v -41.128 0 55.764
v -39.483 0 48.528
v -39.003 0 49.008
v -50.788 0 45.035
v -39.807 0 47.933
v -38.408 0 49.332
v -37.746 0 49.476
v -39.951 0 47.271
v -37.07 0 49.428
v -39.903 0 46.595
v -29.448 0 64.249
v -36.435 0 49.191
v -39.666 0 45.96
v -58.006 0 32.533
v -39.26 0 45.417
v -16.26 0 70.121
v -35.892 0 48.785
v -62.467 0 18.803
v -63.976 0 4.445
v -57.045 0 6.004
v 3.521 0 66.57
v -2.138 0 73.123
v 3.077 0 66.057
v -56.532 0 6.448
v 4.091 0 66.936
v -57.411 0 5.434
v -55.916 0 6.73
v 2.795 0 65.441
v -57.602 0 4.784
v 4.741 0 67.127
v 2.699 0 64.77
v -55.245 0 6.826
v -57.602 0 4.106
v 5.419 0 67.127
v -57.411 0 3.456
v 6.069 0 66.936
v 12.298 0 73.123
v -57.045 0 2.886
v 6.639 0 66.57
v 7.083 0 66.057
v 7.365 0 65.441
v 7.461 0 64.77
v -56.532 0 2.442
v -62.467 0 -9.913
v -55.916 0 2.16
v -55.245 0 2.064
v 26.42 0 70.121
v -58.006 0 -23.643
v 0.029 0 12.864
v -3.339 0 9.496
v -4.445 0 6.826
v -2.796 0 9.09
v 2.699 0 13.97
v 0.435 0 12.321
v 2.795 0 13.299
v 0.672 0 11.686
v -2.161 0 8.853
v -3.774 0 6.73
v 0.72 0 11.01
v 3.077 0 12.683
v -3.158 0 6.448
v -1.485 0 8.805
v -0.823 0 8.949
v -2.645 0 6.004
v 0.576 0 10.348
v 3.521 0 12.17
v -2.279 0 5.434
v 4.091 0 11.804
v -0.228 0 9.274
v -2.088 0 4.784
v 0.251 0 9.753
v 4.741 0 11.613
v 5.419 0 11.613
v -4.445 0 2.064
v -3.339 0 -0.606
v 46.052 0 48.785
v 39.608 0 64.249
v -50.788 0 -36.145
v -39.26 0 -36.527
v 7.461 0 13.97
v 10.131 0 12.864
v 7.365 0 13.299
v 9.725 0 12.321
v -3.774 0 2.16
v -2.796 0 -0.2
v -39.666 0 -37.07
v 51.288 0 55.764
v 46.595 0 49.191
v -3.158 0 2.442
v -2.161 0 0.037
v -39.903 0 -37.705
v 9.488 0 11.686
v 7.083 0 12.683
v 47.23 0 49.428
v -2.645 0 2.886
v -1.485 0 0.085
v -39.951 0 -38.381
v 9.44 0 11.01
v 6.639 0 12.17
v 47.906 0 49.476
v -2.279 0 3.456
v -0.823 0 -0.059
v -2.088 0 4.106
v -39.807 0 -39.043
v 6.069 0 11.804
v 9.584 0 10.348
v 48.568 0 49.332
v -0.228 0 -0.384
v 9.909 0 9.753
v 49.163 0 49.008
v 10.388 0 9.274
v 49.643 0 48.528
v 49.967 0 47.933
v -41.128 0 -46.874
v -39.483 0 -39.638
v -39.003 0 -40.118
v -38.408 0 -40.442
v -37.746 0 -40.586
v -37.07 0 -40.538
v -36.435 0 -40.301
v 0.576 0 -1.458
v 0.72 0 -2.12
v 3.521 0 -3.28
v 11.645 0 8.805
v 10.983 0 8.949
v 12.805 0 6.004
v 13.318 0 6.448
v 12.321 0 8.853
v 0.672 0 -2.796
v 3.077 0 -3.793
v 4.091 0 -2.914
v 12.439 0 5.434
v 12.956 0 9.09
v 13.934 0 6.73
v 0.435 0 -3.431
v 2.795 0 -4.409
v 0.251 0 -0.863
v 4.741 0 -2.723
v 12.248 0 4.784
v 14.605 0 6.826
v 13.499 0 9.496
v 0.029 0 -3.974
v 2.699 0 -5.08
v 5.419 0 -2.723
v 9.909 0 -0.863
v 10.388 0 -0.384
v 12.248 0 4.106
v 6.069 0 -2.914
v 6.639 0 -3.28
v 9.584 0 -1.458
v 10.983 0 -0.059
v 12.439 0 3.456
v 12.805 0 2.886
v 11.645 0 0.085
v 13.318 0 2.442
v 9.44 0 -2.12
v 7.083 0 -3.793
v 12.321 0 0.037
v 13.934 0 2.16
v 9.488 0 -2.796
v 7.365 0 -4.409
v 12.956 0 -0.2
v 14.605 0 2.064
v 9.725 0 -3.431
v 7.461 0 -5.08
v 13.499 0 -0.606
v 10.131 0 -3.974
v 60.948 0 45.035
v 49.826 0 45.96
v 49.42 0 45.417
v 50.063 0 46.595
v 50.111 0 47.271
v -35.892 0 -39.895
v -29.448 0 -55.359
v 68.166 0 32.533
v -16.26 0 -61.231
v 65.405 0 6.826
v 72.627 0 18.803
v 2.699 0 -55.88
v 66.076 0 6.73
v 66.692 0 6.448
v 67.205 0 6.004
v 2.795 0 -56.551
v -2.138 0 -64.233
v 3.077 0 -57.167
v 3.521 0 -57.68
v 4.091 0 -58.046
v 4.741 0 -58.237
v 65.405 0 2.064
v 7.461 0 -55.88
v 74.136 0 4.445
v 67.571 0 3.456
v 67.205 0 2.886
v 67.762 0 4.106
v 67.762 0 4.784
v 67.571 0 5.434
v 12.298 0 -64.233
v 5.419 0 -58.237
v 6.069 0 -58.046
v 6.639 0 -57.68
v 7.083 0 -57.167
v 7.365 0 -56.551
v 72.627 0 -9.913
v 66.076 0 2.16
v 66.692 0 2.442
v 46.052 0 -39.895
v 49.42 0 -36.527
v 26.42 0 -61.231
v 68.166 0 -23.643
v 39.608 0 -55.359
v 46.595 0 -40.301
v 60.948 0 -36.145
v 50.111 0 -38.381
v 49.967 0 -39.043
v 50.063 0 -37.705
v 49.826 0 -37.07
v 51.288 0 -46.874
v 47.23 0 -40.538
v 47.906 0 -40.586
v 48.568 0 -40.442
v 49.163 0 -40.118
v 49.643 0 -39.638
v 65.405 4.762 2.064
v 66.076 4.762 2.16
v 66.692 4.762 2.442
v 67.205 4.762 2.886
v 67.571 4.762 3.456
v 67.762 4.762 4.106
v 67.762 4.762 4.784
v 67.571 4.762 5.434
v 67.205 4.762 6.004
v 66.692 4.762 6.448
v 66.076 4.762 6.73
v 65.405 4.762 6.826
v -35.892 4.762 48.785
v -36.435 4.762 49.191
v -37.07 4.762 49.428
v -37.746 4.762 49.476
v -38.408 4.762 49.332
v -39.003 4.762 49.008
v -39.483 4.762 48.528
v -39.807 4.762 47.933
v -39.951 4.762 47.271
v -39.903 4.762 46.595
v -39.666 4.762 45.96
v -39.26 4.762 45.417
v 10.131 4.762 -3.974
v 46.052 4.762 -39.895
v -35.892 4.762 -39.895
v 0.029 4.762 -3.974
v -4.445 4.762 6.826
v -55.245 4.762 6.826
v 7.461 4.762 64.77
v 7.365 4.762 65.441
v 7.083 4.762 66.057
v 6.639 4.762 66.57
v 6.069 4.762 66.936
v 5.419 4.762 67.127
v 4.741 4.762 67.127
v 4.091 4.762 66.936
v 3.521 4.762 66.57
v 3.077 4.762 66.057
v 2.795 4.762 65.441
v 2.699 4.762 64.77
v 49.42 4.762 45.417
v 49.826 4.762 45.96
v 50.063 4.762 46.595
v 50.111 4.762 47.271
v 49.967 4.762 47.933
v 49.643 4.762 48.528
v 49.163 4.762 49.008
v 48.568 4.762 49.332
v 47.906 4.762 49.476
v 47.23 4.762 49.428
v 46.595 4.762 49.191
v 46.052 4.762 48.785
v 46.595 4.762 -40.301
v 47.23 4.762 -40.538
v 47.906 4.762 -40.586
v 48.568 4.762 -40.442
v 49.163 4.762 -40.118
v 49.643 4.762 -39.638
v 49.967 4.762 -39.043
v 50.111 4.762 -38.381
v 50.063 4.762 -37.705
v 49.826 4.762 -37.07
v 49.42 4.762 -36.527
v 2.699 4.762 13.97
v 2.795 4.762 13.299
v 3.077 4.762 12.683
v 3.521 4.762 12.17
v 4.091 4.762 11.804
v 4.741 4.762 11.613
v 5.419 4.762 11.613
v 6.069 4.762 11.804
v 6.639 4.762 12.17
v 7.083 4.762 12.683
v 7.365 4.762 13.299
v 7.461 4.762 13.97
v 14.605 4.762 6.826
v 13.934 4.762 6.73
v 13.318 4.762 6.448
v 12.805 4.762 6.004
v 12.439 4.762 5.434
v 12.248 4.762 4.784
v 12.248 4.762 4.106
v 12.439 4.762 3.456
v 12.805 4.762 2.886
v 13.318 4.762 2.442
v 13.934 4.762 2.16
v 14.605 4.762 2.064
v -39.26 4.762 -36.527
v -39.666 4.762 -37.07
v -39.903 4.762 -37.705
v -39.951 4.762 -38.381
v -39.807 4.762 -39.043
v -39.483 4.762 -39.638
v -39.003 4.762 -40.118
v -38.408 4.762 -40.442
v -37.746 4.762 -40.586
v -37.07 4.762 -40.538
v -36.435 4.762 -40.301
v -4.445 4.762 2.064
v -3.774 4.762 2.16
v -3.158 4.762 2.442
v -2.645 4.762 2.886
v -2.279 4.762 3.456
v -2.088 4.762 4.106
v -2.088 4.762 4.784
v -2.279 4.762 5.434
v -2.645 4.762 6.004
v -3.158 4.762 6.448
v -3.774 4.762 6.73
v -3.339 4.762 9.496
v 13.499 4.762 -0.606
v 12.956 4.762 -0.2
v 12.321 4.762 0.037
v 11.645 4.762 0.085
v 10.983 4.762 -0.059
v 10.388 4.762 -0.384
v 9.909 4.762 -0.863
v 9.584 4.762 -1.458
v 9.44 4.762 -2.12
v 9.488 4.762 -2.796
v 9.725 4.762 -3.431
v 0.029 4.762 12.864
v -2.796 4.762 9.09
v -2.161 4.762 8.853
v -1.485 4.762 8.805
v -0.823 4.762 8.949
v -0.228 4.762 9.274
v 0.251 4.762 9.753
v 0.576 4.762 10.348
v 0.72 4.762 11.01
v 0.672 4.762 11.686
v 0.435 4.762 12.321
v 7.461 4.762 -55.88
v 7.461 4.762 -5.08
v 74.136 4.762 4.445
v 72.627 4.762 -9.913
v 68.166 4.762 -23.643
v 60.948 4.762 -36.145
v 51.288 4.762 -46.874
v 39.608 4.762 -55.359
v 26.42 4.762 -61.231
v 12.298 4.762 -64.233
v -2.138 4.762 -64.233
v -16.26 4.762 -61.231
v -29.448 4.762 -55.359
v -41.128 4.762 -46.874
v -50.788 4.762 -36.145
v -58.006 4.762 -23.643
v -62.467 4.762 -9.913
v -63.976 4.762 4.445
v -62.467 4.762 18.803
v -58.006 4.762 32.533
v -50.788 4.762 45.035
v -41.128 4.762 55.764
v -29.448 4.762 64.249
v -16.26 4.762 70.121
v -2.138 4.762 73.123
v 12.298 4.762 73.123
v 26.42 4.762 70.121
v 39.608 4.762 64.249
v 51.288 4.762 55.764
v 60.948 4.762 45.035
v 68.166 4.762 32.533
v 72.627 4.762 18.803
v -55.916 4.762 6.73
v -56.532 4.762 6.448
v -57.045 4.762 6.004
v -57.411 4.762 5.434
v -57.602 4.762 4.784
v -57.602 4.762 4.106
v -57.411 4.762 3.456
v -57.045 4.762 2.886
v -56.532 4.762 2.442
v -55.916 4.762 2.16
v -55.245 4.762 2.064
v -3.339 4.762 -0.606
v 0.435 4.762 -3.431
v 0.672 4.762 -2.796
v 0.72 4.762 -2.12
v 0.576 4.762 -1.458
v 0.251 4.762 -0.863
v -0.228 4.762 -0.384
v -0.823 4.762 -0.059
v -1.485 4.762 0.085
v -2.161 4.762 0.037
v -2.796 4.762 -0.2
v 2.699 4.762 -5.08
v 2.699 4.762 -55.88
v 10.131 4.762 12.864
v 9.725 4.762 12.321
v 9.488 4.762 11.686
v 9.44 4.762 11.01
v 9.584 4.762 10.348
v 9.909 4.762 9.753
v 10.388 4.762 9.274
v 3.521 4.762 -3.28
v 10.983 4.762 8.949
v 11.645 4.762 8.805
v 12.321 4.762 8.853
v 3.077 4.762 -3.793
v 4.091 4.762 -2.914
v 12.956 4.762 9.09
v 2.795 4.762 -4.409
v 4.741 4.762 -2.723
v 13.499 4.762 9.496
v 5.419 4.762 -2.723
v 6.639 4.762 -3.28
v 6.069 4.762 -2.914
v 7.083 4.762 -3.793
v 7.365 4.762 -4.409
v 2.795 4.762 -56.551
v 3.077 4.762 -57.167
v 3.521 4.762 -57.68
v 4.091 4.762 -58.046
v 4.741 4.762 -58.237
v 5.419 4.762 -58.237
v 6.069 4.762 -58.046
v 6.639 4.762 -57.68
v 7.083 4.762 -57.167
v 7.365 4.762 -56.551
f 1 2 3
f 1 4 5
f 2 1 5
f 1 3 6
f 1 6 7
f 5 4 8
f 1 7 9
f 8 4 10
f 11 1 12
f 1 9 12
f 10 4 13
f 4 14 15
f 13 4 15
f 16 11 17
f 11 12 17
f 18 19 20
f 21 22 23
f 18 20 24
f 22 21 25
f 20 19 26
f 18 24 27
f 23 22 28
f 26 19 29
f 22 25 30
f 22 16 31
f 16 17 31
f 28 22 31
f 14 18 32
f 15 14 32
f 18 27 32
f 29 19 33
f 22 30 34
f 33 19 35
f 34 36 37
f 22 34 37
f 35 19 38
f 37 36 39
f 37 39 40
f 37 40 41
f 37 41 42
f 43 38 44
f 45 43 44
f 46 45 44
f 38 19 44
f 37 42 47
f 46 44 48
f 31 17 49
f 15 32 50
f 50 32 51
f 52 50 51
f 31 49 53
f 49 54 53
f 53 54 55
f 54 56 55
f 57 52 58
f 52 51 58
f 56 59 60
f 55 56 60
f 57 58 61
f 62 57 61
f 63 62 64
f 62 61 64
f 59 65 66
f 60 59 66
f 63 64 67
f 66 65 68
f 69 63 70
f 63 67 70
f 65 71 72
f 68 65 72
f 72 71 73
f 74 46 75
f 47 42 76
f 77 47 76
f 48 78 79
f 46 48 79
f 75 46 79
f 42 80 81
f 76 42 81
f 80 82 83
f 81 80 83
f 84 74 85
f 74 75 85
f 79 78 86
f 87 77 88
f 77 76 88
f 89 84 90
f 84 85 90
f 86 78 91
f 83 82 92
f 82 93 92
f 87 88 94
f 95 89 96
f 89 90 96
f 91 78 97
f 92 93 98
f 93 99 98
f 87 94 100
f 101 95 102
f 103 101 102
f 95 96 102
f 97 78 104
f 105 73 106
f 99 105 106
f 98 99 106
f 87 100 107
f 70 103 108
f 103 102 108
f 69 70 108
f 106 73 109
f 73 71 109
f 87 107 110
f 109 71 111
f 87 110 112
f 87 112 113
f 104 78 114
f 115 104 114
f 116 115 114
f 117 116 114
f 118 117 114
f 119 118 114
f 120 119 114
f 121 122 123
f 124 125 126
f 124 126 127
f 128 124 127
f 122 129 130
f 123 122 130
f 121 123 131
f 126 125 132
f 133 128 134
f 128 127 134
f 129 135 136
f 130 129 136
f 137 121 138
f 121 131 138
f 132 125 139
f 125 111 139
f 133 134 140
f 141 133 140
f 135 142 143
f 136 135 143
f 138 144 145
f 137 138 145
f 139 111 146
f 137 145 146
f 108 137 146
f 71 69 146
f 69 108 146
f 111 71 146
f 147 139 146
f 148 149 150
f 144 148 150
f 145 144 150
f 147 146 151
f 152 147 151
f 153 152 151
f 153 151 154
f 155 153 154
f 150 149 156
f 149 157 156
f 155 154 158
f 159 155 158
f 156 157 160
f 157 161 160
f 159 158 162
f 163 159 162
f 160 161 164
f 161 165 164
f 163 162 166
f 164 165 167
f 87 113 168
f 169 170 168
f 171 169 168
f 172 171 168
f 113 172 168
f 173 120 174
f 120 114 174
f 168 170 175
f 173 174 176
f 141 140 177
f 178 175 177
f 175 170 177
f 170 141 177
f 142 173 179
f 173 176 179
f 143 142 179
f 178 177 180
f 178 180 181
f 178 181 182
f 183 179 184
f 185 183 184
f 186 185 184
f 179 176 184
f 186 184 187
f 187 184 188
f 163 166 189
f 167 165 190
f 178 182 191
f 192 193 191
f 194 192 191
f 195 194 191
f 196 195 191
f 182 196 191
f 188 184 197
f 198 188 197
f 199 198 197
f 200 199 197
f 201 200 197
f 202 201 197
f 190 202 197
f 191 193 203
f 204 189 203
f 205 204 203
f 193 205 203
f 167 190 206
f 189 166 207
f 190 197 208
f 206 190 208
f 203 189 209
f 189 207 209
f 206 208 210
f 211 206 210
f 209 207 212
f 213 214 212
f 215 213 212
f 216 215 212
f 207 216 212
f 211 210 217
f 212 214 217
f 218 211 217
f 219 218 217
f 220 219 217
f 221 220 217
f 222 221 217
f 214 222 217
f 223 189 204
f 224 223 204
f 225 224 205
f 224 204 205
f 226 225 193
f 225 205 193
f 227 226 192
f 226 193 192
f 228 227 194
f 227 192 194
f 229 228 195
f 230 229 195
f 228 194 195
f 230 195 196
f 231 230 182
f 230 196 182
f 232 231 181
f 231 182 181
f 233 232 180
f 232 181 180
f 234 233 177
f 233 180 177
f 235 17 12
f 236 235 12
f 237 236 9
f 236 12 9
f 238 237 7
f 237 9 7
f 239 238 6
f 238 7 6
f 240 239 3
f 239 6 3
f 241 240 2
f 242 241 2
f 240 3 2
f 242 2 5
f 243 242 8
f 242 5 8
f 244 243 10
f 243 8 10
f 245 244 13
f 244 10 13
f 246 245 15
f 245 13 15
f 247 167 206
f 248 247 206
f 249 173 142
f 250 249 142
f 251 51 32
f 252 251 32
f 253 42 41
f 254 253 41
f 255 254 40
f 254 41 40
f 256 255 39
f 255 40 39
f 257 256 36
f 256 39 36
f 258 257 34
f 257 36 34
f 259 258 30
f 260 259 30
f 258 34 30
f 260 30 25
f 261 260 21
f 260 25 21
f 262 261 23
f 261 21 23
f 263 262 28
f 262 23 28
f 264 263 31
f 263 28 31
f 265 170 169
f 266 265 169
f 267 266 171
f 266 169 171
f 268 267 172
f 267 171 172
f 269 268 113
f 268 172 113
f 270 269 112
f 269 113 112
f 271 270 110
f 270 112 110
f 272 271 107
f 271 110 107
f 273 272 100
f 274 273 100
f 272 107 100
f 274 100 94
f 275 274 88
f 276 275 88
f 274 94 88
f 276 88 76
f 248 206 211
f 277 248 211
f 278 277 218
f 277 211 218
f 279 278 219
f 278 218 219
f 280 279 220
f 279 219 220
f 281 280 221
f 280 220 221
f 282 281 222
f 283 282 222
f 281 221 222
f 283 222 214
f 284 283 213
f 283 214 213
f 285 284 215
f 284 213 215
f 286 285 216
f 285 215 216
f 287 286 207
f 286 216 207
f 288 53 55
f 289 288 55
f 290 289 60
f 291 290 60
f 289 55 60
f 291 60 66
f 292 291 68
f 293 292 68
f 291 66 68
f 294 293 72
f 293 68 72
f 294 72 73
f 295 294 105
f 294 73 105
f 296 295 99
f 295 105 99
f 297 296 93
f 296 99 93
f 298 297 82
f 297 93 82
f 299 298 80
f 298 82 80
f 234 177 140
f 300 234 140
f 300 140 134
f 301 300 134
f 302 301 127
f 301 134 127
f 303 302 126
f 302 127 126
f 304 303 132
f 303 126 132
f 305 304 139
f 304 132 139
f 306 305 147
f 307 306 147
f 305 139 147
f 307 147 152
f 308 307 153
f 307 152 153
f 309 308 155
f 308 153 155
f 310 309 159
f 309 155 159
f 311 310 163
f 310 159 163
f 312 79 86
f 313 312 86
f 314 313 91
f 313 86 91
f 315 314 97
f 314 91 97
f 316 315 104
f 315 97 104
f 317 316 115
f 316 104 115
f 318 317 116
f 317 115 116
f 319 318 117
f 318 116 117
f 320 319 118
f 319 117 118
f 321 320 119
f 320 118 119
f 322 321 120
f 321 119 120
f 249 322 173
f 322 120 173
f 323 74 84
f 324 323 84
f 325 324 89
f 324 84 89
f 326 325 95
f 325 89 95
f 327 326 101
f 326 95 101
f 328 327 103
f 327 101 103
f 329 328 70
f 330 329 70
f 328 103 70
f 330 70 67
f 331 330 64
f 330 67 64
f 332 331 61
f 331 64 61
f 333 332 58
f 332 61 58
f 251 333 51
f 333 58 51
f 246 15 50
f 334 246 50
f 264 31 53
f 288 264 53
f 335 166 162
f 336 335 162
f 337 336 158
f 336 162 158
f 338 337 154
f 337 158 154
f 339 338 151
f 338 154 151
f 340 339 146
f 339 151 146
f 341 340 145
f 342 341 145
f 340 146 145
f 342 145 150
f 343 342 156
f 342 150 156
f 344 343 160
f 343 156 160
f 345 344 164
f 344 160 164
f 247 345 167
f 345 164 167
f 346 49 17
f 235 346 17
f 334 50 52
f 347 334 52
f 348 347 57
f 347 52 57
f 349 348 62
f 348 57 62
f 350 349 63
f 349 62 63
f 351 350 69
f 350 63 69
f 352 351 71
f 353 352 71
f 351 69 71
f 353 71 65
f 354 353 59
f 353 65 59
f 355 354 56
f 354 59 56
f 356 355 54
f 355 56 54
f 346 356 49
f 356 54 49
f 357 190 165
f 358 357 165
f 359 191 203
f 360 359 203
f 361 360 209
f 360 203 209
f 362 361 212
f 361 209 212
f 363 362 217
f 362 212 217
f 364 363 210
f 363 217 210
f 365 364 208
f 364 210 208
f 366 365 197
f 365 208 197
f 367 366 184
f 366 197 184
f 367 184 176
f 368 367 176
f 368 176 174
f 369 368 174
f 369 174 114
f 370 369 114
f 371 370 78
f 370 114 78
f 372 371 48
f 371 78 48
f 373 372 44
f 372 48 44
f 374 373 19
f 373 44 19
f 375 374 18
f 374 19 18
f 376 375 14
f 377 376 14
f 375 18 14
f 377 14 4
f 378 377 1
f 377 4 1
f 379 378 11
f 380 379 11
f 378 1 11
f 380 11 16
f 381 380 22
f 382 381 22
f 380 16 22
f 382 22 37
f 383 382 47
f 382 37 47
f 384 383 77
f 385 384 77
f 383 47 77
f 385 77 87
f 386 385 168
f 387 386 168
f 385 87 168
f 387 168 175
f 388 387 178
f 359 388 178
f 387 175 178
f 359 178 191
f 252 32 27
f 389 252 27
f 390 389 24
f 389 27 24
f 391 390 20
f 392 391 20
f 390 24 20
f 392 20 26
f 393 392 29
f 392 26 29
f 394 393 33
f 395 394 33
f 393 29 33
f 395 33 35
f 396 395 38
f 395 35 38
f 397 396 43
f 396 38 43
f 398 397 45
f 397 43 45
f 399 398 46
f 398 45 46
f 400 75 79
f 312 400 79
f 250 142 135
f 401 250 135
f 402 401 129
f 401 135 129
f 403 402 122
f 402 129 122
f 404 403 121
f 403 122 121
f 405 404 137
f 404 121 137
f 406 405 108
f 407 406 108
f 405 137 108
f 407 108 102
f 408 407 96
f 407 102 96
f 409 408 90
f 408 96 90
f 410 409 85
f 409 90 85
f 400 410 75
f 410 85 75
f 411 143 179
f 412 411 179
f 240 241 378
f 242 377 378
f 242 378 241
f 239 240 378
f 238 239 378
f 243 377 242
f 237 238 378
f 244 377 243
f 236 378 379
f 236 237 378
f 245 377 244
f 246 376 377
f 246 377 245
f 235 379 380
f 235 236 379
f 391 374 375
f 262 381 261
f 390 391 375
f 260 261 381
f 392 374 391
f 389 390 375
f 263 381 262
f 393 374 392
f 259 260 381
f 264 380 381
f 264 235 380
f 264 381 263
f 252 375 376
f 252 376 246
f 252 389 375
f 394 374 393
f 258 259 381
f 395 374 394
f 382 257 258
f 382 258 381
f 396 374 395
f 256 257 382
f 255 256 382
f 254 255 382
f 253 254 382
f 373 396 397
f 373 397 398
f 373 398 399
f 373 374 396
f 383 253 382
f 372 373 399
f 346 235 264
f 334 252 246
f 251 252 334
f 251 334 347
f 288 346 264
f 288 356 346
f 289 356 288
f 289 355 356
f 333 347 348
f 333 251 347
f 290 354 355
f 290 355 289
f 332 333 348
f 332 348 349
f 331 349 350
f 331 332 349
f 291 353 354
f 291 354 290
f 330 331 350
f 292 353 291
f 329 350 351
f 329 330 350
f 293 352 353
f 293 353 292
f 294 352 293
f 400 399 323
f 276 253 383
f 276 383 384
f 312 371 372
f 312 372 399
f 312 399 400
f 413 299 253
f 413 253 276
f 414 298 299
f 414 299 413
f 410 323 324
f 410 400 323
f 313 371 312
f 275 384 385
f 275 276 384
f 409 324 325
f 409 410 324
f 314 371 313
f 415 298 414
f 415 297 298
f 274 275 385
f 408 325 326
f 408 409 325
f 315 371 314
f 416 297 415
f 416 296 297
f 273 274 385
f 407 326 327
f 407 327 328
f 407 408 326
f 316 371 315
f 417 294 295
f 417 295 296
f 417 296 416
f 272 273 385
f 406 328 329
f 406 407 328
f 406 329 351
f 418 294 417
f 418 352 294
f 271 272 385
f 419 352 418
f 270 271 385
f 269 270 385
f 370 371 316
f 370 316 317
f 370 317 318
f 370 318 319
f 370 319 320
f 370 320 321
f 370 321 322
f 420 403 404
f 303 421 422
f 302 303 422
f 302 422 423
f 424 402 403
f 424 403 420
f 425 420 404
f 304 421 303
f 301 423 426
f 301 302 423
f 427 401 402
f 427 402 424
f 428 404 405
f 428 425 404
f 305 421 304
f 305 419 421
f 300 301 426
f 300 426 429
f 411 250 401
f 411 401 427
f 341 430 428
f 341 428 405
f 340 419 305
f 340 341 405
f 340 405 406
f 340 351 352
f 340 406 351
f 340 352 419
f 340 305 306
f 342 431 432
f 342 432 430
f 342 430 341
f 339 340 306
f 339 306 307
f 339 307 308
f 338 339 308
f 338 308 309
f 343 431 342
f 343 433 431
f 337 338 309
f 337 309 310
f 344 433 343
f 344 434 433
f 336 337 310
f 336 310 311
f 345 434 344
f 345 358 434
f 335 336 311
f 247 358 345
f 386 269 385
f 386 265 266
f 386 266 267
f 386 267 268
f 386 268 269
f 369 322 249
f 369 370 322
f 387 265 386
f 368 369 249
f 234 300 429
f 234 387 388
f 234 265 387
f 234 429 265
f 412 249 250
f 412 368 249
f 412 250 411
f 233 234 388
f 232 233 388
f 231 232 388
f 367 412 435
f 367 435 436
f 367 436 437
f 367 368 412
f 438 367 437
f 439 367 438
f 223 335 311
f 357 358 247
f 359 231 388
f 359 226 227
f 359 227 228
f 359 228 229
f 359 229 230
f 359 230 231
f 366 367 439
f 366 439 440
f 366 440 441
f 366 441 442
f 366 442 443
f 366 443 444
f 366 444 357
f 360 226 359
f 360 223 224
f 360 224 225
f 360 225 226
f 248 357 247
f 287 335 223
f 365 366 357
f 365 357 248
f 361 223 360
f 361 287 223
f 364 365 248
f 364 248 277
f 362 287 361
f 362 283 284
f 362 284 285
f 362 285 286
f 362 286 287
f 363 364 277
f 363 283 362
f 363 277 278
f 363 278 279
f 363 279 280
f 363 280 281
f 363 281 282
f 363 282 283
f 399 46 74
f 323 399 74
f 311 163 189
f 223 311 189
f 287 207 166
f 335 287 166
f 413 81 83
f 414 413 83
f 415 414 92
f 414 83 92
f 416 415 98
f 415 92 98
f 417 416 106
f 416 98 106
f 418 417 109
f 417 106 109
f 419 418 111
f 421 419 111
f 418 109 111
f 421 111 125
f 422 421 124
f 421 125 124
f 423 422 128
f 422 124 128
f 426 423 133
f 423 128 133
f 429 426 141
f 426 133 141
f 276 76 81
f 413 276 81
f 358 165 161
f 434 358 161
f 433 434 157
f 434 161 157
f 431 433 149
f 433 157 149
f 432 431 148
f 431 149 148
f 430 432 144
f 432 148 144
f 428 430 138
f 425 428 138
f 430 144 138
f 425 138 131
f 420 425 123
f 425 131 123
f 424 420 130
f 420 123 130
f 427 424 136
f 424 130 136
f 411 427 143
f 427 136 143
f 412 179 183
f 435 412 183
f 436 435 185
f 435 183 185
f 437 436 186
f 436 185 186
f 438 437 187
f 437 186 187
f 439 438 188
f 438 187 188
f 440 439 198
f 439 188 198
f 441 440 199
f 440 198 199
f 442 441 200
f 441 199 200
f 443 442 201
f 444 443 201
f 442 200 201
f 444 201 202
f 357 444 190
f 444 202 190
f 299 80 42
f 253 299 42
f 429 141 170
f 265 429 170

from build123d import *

# Parameters (mm, degrees)
SKETCH1_R           = 69.05625
BOSS_EXTRUDE1_DEPTH = 4.7625


with BuildPart() as part:
    # Sketch1 → Boss-Extrude1 (new body)
    with BuildSketch(Plane(origin=(0, 0, 0), x_dir=(1, 0, 0), z_dir=(0, 1, 0))):
        with Locations((5.08, -4.445)):
            Circle(SKETCH1_R)
        with BuildLine():
            Line((2.69875, 5.08), (2.69875, 55.88))
            ThreePointArc((2.69875, 55.88), (5.08, 58.26125), (7.46125, 55.88))
            Line((7.46125, 55.88), (7.46125, 5.08))
            ThreePointArc((7.46125, 5.08), (5.08, 2.69875), (2.69875, 5.08))
        make_face(mode=Mode.SUBTRACT)
        with BuildLine():
            Line((10.131394068, 3.973990114), (46.052418552, 39.895014598))
            ThreePointArc((46.052418552, 39.895014598), (49.420014598, 39.895014598), (49.420014598, 36.527418552))
            Line((49.420014598, 36.527418552), (13.498990114, 0.606394068))
            ThreePointArc((13.498990114, 0.606394068), (10.131394068, 0.606394068), (10.131394068, 3.973990114))
        make_face(mode=Mode.SUBTRACT)
        with BuildLine():
            Line((14.605, -2.06375), (65.405, -2.06375))
            ThreePointArc((65.405, -2.06375), (67.78625, -4.445), (65.405, -6.82625))
            Line((65.405, -6.82625), (14.605, -6.82625))
            ThreePointArc((14.605, -6.82625), (12.22375, -4.445), (14.605, -2.06375))
        make_face(mode=Mode.SUBTRACT)
        with BuildLine():
            Line((13.498990114, -9.496394068), (49.420014598, -45.417418552))
            ThreePointArc((49.420014598, -45.417418552), (49.420014598, -48.785014598), (46.052418552, -48.785014598))
            Line((46.052418552, -48.785014598), (10.131394068, -12.863990114))
            ThreePointArc((10.131394068, -12.863990114), (10.131394068, -9.496394068), (13.498990114, -9.496394068))
        make_face(mode=Mode.SUBTRACT)
        with BuildLine():
            Line((7.46125, -13.97), (7.46125, -64.77))
            ThreePointArc((7.46125, -64.77), (5.08, -67.15125), (2.69875, -64.77))
            Line((2.69875, -64.77), (2.69875, -13.97))
            ThreePointArc((2.69875, -13.97), (5.08, -11.58875), (7.46125, -13.97))
        make_face(mode=Mode.SUBTRACT)
        with BuildLine():
            Line((0.028605932, -12.863990114), (-35.892418552, -48.785014598))
            ThreePointArc((-35.892418552, -48.785014598), (-39.260014598, -48.785014598), (-39.260014598, -45.417418552))
            Line((-39.260014598, -45.417418552), (-3.338990114, -9.496394068))
            ThreePointArc((-3.338990114, -9.496394068), (0.028605932, -9.496394068), (0.028605932, -12.863990114))
        make_face(mode=Mode.SUBTRACT)
        with BuildLine():
            Line((-4.445, -6.82625), (-55.245, -6.82625))
            ThreePointArc((-55.245, -6.82625), (-57.62625, -4.445), (-55.245, -2.06375))
            Line((-55.245, -2.06375), (-4.445, -2.06375))
            ThreePointArc((-4.445, -2.06375), (-2.06375, -4.445), (-4.445, -6.82625))
        make_face(mode=Mode.SUBTRACT)
        with BuildLine():
            Line((-3.338990114, 0.606394068), (-39.260014598, 36.527418552))
            ThreePointArc((-39.260014598, 36.527418552), (-39.260014598, 39.895014598), (-35.892418552, 39.895014598))
            Line((-35.892418552, 39.895014598), (0.028605932, 3.973990114))
            ThreePointArc((0.028605932, 3.973990114), (0.028605932, 0.606394068), (-3.338990114, 0.606394068))
        make_face(mode=Mode.SUBTRACT)
    extrude(amount=BOSS_EXTRUDE1_DEPTH)


solid = part.part
